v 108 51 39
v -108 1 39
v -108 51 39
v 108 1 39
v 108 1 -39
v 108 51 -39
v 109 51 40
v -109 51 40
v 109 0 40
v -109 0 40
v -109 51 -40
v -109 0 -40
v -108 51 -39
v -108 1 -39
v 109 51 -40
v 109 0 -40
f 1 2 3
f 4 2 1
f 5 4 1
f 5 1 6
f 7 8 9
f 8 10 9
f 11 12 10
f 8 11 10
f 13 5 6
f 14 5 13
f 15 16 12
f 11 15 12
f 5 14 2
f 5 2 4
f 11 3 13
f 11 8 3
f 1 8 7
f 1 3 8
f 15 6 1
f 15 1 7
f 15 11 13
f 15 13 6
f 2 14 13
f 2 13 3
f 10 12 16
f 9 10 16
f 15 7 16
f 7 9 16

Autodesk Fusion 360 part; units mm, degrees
sketch "Skizze1" plane through (0, 0, 0) normal (0, 1, 0) x (1, 0, 0)
  line L0 (108, 39) -> (-108, 39)
  line L1 (-108, 39) -> (-108, -39)
  line L2 (-108, -39) -> (108, -39)
  line L3 (108, -39) -> (108, 39)
  line L4 (108, 39) -> (-108, -39) construction
  line L5 (-108, 39) -> (108, -39) construction
  line L6 (109, 40) -> (-109, 40)
  line L7 (-109, 40) -> (-109, -40)
  line L8 (-109, -40) -> (109, -40)
  line L9 (109, -40) -> (109, 40)
  line L10 (109, 40) -> (-109, -40) construction
  line L11 (-109, 40) -> (109, -40) construction
  dimension "d4" = 216
  dimension "d5" = 78
  dimension "d6" = 218
  dimension "d7" = 80
extrude "Extrusion1" add sketch "Skizze1" along normal blind 1 contours L0 L1 L2 L3 | L6 L7 L8 L9
extrude "Extrusion2" add sketch "Skizze1" along normal blind 51
